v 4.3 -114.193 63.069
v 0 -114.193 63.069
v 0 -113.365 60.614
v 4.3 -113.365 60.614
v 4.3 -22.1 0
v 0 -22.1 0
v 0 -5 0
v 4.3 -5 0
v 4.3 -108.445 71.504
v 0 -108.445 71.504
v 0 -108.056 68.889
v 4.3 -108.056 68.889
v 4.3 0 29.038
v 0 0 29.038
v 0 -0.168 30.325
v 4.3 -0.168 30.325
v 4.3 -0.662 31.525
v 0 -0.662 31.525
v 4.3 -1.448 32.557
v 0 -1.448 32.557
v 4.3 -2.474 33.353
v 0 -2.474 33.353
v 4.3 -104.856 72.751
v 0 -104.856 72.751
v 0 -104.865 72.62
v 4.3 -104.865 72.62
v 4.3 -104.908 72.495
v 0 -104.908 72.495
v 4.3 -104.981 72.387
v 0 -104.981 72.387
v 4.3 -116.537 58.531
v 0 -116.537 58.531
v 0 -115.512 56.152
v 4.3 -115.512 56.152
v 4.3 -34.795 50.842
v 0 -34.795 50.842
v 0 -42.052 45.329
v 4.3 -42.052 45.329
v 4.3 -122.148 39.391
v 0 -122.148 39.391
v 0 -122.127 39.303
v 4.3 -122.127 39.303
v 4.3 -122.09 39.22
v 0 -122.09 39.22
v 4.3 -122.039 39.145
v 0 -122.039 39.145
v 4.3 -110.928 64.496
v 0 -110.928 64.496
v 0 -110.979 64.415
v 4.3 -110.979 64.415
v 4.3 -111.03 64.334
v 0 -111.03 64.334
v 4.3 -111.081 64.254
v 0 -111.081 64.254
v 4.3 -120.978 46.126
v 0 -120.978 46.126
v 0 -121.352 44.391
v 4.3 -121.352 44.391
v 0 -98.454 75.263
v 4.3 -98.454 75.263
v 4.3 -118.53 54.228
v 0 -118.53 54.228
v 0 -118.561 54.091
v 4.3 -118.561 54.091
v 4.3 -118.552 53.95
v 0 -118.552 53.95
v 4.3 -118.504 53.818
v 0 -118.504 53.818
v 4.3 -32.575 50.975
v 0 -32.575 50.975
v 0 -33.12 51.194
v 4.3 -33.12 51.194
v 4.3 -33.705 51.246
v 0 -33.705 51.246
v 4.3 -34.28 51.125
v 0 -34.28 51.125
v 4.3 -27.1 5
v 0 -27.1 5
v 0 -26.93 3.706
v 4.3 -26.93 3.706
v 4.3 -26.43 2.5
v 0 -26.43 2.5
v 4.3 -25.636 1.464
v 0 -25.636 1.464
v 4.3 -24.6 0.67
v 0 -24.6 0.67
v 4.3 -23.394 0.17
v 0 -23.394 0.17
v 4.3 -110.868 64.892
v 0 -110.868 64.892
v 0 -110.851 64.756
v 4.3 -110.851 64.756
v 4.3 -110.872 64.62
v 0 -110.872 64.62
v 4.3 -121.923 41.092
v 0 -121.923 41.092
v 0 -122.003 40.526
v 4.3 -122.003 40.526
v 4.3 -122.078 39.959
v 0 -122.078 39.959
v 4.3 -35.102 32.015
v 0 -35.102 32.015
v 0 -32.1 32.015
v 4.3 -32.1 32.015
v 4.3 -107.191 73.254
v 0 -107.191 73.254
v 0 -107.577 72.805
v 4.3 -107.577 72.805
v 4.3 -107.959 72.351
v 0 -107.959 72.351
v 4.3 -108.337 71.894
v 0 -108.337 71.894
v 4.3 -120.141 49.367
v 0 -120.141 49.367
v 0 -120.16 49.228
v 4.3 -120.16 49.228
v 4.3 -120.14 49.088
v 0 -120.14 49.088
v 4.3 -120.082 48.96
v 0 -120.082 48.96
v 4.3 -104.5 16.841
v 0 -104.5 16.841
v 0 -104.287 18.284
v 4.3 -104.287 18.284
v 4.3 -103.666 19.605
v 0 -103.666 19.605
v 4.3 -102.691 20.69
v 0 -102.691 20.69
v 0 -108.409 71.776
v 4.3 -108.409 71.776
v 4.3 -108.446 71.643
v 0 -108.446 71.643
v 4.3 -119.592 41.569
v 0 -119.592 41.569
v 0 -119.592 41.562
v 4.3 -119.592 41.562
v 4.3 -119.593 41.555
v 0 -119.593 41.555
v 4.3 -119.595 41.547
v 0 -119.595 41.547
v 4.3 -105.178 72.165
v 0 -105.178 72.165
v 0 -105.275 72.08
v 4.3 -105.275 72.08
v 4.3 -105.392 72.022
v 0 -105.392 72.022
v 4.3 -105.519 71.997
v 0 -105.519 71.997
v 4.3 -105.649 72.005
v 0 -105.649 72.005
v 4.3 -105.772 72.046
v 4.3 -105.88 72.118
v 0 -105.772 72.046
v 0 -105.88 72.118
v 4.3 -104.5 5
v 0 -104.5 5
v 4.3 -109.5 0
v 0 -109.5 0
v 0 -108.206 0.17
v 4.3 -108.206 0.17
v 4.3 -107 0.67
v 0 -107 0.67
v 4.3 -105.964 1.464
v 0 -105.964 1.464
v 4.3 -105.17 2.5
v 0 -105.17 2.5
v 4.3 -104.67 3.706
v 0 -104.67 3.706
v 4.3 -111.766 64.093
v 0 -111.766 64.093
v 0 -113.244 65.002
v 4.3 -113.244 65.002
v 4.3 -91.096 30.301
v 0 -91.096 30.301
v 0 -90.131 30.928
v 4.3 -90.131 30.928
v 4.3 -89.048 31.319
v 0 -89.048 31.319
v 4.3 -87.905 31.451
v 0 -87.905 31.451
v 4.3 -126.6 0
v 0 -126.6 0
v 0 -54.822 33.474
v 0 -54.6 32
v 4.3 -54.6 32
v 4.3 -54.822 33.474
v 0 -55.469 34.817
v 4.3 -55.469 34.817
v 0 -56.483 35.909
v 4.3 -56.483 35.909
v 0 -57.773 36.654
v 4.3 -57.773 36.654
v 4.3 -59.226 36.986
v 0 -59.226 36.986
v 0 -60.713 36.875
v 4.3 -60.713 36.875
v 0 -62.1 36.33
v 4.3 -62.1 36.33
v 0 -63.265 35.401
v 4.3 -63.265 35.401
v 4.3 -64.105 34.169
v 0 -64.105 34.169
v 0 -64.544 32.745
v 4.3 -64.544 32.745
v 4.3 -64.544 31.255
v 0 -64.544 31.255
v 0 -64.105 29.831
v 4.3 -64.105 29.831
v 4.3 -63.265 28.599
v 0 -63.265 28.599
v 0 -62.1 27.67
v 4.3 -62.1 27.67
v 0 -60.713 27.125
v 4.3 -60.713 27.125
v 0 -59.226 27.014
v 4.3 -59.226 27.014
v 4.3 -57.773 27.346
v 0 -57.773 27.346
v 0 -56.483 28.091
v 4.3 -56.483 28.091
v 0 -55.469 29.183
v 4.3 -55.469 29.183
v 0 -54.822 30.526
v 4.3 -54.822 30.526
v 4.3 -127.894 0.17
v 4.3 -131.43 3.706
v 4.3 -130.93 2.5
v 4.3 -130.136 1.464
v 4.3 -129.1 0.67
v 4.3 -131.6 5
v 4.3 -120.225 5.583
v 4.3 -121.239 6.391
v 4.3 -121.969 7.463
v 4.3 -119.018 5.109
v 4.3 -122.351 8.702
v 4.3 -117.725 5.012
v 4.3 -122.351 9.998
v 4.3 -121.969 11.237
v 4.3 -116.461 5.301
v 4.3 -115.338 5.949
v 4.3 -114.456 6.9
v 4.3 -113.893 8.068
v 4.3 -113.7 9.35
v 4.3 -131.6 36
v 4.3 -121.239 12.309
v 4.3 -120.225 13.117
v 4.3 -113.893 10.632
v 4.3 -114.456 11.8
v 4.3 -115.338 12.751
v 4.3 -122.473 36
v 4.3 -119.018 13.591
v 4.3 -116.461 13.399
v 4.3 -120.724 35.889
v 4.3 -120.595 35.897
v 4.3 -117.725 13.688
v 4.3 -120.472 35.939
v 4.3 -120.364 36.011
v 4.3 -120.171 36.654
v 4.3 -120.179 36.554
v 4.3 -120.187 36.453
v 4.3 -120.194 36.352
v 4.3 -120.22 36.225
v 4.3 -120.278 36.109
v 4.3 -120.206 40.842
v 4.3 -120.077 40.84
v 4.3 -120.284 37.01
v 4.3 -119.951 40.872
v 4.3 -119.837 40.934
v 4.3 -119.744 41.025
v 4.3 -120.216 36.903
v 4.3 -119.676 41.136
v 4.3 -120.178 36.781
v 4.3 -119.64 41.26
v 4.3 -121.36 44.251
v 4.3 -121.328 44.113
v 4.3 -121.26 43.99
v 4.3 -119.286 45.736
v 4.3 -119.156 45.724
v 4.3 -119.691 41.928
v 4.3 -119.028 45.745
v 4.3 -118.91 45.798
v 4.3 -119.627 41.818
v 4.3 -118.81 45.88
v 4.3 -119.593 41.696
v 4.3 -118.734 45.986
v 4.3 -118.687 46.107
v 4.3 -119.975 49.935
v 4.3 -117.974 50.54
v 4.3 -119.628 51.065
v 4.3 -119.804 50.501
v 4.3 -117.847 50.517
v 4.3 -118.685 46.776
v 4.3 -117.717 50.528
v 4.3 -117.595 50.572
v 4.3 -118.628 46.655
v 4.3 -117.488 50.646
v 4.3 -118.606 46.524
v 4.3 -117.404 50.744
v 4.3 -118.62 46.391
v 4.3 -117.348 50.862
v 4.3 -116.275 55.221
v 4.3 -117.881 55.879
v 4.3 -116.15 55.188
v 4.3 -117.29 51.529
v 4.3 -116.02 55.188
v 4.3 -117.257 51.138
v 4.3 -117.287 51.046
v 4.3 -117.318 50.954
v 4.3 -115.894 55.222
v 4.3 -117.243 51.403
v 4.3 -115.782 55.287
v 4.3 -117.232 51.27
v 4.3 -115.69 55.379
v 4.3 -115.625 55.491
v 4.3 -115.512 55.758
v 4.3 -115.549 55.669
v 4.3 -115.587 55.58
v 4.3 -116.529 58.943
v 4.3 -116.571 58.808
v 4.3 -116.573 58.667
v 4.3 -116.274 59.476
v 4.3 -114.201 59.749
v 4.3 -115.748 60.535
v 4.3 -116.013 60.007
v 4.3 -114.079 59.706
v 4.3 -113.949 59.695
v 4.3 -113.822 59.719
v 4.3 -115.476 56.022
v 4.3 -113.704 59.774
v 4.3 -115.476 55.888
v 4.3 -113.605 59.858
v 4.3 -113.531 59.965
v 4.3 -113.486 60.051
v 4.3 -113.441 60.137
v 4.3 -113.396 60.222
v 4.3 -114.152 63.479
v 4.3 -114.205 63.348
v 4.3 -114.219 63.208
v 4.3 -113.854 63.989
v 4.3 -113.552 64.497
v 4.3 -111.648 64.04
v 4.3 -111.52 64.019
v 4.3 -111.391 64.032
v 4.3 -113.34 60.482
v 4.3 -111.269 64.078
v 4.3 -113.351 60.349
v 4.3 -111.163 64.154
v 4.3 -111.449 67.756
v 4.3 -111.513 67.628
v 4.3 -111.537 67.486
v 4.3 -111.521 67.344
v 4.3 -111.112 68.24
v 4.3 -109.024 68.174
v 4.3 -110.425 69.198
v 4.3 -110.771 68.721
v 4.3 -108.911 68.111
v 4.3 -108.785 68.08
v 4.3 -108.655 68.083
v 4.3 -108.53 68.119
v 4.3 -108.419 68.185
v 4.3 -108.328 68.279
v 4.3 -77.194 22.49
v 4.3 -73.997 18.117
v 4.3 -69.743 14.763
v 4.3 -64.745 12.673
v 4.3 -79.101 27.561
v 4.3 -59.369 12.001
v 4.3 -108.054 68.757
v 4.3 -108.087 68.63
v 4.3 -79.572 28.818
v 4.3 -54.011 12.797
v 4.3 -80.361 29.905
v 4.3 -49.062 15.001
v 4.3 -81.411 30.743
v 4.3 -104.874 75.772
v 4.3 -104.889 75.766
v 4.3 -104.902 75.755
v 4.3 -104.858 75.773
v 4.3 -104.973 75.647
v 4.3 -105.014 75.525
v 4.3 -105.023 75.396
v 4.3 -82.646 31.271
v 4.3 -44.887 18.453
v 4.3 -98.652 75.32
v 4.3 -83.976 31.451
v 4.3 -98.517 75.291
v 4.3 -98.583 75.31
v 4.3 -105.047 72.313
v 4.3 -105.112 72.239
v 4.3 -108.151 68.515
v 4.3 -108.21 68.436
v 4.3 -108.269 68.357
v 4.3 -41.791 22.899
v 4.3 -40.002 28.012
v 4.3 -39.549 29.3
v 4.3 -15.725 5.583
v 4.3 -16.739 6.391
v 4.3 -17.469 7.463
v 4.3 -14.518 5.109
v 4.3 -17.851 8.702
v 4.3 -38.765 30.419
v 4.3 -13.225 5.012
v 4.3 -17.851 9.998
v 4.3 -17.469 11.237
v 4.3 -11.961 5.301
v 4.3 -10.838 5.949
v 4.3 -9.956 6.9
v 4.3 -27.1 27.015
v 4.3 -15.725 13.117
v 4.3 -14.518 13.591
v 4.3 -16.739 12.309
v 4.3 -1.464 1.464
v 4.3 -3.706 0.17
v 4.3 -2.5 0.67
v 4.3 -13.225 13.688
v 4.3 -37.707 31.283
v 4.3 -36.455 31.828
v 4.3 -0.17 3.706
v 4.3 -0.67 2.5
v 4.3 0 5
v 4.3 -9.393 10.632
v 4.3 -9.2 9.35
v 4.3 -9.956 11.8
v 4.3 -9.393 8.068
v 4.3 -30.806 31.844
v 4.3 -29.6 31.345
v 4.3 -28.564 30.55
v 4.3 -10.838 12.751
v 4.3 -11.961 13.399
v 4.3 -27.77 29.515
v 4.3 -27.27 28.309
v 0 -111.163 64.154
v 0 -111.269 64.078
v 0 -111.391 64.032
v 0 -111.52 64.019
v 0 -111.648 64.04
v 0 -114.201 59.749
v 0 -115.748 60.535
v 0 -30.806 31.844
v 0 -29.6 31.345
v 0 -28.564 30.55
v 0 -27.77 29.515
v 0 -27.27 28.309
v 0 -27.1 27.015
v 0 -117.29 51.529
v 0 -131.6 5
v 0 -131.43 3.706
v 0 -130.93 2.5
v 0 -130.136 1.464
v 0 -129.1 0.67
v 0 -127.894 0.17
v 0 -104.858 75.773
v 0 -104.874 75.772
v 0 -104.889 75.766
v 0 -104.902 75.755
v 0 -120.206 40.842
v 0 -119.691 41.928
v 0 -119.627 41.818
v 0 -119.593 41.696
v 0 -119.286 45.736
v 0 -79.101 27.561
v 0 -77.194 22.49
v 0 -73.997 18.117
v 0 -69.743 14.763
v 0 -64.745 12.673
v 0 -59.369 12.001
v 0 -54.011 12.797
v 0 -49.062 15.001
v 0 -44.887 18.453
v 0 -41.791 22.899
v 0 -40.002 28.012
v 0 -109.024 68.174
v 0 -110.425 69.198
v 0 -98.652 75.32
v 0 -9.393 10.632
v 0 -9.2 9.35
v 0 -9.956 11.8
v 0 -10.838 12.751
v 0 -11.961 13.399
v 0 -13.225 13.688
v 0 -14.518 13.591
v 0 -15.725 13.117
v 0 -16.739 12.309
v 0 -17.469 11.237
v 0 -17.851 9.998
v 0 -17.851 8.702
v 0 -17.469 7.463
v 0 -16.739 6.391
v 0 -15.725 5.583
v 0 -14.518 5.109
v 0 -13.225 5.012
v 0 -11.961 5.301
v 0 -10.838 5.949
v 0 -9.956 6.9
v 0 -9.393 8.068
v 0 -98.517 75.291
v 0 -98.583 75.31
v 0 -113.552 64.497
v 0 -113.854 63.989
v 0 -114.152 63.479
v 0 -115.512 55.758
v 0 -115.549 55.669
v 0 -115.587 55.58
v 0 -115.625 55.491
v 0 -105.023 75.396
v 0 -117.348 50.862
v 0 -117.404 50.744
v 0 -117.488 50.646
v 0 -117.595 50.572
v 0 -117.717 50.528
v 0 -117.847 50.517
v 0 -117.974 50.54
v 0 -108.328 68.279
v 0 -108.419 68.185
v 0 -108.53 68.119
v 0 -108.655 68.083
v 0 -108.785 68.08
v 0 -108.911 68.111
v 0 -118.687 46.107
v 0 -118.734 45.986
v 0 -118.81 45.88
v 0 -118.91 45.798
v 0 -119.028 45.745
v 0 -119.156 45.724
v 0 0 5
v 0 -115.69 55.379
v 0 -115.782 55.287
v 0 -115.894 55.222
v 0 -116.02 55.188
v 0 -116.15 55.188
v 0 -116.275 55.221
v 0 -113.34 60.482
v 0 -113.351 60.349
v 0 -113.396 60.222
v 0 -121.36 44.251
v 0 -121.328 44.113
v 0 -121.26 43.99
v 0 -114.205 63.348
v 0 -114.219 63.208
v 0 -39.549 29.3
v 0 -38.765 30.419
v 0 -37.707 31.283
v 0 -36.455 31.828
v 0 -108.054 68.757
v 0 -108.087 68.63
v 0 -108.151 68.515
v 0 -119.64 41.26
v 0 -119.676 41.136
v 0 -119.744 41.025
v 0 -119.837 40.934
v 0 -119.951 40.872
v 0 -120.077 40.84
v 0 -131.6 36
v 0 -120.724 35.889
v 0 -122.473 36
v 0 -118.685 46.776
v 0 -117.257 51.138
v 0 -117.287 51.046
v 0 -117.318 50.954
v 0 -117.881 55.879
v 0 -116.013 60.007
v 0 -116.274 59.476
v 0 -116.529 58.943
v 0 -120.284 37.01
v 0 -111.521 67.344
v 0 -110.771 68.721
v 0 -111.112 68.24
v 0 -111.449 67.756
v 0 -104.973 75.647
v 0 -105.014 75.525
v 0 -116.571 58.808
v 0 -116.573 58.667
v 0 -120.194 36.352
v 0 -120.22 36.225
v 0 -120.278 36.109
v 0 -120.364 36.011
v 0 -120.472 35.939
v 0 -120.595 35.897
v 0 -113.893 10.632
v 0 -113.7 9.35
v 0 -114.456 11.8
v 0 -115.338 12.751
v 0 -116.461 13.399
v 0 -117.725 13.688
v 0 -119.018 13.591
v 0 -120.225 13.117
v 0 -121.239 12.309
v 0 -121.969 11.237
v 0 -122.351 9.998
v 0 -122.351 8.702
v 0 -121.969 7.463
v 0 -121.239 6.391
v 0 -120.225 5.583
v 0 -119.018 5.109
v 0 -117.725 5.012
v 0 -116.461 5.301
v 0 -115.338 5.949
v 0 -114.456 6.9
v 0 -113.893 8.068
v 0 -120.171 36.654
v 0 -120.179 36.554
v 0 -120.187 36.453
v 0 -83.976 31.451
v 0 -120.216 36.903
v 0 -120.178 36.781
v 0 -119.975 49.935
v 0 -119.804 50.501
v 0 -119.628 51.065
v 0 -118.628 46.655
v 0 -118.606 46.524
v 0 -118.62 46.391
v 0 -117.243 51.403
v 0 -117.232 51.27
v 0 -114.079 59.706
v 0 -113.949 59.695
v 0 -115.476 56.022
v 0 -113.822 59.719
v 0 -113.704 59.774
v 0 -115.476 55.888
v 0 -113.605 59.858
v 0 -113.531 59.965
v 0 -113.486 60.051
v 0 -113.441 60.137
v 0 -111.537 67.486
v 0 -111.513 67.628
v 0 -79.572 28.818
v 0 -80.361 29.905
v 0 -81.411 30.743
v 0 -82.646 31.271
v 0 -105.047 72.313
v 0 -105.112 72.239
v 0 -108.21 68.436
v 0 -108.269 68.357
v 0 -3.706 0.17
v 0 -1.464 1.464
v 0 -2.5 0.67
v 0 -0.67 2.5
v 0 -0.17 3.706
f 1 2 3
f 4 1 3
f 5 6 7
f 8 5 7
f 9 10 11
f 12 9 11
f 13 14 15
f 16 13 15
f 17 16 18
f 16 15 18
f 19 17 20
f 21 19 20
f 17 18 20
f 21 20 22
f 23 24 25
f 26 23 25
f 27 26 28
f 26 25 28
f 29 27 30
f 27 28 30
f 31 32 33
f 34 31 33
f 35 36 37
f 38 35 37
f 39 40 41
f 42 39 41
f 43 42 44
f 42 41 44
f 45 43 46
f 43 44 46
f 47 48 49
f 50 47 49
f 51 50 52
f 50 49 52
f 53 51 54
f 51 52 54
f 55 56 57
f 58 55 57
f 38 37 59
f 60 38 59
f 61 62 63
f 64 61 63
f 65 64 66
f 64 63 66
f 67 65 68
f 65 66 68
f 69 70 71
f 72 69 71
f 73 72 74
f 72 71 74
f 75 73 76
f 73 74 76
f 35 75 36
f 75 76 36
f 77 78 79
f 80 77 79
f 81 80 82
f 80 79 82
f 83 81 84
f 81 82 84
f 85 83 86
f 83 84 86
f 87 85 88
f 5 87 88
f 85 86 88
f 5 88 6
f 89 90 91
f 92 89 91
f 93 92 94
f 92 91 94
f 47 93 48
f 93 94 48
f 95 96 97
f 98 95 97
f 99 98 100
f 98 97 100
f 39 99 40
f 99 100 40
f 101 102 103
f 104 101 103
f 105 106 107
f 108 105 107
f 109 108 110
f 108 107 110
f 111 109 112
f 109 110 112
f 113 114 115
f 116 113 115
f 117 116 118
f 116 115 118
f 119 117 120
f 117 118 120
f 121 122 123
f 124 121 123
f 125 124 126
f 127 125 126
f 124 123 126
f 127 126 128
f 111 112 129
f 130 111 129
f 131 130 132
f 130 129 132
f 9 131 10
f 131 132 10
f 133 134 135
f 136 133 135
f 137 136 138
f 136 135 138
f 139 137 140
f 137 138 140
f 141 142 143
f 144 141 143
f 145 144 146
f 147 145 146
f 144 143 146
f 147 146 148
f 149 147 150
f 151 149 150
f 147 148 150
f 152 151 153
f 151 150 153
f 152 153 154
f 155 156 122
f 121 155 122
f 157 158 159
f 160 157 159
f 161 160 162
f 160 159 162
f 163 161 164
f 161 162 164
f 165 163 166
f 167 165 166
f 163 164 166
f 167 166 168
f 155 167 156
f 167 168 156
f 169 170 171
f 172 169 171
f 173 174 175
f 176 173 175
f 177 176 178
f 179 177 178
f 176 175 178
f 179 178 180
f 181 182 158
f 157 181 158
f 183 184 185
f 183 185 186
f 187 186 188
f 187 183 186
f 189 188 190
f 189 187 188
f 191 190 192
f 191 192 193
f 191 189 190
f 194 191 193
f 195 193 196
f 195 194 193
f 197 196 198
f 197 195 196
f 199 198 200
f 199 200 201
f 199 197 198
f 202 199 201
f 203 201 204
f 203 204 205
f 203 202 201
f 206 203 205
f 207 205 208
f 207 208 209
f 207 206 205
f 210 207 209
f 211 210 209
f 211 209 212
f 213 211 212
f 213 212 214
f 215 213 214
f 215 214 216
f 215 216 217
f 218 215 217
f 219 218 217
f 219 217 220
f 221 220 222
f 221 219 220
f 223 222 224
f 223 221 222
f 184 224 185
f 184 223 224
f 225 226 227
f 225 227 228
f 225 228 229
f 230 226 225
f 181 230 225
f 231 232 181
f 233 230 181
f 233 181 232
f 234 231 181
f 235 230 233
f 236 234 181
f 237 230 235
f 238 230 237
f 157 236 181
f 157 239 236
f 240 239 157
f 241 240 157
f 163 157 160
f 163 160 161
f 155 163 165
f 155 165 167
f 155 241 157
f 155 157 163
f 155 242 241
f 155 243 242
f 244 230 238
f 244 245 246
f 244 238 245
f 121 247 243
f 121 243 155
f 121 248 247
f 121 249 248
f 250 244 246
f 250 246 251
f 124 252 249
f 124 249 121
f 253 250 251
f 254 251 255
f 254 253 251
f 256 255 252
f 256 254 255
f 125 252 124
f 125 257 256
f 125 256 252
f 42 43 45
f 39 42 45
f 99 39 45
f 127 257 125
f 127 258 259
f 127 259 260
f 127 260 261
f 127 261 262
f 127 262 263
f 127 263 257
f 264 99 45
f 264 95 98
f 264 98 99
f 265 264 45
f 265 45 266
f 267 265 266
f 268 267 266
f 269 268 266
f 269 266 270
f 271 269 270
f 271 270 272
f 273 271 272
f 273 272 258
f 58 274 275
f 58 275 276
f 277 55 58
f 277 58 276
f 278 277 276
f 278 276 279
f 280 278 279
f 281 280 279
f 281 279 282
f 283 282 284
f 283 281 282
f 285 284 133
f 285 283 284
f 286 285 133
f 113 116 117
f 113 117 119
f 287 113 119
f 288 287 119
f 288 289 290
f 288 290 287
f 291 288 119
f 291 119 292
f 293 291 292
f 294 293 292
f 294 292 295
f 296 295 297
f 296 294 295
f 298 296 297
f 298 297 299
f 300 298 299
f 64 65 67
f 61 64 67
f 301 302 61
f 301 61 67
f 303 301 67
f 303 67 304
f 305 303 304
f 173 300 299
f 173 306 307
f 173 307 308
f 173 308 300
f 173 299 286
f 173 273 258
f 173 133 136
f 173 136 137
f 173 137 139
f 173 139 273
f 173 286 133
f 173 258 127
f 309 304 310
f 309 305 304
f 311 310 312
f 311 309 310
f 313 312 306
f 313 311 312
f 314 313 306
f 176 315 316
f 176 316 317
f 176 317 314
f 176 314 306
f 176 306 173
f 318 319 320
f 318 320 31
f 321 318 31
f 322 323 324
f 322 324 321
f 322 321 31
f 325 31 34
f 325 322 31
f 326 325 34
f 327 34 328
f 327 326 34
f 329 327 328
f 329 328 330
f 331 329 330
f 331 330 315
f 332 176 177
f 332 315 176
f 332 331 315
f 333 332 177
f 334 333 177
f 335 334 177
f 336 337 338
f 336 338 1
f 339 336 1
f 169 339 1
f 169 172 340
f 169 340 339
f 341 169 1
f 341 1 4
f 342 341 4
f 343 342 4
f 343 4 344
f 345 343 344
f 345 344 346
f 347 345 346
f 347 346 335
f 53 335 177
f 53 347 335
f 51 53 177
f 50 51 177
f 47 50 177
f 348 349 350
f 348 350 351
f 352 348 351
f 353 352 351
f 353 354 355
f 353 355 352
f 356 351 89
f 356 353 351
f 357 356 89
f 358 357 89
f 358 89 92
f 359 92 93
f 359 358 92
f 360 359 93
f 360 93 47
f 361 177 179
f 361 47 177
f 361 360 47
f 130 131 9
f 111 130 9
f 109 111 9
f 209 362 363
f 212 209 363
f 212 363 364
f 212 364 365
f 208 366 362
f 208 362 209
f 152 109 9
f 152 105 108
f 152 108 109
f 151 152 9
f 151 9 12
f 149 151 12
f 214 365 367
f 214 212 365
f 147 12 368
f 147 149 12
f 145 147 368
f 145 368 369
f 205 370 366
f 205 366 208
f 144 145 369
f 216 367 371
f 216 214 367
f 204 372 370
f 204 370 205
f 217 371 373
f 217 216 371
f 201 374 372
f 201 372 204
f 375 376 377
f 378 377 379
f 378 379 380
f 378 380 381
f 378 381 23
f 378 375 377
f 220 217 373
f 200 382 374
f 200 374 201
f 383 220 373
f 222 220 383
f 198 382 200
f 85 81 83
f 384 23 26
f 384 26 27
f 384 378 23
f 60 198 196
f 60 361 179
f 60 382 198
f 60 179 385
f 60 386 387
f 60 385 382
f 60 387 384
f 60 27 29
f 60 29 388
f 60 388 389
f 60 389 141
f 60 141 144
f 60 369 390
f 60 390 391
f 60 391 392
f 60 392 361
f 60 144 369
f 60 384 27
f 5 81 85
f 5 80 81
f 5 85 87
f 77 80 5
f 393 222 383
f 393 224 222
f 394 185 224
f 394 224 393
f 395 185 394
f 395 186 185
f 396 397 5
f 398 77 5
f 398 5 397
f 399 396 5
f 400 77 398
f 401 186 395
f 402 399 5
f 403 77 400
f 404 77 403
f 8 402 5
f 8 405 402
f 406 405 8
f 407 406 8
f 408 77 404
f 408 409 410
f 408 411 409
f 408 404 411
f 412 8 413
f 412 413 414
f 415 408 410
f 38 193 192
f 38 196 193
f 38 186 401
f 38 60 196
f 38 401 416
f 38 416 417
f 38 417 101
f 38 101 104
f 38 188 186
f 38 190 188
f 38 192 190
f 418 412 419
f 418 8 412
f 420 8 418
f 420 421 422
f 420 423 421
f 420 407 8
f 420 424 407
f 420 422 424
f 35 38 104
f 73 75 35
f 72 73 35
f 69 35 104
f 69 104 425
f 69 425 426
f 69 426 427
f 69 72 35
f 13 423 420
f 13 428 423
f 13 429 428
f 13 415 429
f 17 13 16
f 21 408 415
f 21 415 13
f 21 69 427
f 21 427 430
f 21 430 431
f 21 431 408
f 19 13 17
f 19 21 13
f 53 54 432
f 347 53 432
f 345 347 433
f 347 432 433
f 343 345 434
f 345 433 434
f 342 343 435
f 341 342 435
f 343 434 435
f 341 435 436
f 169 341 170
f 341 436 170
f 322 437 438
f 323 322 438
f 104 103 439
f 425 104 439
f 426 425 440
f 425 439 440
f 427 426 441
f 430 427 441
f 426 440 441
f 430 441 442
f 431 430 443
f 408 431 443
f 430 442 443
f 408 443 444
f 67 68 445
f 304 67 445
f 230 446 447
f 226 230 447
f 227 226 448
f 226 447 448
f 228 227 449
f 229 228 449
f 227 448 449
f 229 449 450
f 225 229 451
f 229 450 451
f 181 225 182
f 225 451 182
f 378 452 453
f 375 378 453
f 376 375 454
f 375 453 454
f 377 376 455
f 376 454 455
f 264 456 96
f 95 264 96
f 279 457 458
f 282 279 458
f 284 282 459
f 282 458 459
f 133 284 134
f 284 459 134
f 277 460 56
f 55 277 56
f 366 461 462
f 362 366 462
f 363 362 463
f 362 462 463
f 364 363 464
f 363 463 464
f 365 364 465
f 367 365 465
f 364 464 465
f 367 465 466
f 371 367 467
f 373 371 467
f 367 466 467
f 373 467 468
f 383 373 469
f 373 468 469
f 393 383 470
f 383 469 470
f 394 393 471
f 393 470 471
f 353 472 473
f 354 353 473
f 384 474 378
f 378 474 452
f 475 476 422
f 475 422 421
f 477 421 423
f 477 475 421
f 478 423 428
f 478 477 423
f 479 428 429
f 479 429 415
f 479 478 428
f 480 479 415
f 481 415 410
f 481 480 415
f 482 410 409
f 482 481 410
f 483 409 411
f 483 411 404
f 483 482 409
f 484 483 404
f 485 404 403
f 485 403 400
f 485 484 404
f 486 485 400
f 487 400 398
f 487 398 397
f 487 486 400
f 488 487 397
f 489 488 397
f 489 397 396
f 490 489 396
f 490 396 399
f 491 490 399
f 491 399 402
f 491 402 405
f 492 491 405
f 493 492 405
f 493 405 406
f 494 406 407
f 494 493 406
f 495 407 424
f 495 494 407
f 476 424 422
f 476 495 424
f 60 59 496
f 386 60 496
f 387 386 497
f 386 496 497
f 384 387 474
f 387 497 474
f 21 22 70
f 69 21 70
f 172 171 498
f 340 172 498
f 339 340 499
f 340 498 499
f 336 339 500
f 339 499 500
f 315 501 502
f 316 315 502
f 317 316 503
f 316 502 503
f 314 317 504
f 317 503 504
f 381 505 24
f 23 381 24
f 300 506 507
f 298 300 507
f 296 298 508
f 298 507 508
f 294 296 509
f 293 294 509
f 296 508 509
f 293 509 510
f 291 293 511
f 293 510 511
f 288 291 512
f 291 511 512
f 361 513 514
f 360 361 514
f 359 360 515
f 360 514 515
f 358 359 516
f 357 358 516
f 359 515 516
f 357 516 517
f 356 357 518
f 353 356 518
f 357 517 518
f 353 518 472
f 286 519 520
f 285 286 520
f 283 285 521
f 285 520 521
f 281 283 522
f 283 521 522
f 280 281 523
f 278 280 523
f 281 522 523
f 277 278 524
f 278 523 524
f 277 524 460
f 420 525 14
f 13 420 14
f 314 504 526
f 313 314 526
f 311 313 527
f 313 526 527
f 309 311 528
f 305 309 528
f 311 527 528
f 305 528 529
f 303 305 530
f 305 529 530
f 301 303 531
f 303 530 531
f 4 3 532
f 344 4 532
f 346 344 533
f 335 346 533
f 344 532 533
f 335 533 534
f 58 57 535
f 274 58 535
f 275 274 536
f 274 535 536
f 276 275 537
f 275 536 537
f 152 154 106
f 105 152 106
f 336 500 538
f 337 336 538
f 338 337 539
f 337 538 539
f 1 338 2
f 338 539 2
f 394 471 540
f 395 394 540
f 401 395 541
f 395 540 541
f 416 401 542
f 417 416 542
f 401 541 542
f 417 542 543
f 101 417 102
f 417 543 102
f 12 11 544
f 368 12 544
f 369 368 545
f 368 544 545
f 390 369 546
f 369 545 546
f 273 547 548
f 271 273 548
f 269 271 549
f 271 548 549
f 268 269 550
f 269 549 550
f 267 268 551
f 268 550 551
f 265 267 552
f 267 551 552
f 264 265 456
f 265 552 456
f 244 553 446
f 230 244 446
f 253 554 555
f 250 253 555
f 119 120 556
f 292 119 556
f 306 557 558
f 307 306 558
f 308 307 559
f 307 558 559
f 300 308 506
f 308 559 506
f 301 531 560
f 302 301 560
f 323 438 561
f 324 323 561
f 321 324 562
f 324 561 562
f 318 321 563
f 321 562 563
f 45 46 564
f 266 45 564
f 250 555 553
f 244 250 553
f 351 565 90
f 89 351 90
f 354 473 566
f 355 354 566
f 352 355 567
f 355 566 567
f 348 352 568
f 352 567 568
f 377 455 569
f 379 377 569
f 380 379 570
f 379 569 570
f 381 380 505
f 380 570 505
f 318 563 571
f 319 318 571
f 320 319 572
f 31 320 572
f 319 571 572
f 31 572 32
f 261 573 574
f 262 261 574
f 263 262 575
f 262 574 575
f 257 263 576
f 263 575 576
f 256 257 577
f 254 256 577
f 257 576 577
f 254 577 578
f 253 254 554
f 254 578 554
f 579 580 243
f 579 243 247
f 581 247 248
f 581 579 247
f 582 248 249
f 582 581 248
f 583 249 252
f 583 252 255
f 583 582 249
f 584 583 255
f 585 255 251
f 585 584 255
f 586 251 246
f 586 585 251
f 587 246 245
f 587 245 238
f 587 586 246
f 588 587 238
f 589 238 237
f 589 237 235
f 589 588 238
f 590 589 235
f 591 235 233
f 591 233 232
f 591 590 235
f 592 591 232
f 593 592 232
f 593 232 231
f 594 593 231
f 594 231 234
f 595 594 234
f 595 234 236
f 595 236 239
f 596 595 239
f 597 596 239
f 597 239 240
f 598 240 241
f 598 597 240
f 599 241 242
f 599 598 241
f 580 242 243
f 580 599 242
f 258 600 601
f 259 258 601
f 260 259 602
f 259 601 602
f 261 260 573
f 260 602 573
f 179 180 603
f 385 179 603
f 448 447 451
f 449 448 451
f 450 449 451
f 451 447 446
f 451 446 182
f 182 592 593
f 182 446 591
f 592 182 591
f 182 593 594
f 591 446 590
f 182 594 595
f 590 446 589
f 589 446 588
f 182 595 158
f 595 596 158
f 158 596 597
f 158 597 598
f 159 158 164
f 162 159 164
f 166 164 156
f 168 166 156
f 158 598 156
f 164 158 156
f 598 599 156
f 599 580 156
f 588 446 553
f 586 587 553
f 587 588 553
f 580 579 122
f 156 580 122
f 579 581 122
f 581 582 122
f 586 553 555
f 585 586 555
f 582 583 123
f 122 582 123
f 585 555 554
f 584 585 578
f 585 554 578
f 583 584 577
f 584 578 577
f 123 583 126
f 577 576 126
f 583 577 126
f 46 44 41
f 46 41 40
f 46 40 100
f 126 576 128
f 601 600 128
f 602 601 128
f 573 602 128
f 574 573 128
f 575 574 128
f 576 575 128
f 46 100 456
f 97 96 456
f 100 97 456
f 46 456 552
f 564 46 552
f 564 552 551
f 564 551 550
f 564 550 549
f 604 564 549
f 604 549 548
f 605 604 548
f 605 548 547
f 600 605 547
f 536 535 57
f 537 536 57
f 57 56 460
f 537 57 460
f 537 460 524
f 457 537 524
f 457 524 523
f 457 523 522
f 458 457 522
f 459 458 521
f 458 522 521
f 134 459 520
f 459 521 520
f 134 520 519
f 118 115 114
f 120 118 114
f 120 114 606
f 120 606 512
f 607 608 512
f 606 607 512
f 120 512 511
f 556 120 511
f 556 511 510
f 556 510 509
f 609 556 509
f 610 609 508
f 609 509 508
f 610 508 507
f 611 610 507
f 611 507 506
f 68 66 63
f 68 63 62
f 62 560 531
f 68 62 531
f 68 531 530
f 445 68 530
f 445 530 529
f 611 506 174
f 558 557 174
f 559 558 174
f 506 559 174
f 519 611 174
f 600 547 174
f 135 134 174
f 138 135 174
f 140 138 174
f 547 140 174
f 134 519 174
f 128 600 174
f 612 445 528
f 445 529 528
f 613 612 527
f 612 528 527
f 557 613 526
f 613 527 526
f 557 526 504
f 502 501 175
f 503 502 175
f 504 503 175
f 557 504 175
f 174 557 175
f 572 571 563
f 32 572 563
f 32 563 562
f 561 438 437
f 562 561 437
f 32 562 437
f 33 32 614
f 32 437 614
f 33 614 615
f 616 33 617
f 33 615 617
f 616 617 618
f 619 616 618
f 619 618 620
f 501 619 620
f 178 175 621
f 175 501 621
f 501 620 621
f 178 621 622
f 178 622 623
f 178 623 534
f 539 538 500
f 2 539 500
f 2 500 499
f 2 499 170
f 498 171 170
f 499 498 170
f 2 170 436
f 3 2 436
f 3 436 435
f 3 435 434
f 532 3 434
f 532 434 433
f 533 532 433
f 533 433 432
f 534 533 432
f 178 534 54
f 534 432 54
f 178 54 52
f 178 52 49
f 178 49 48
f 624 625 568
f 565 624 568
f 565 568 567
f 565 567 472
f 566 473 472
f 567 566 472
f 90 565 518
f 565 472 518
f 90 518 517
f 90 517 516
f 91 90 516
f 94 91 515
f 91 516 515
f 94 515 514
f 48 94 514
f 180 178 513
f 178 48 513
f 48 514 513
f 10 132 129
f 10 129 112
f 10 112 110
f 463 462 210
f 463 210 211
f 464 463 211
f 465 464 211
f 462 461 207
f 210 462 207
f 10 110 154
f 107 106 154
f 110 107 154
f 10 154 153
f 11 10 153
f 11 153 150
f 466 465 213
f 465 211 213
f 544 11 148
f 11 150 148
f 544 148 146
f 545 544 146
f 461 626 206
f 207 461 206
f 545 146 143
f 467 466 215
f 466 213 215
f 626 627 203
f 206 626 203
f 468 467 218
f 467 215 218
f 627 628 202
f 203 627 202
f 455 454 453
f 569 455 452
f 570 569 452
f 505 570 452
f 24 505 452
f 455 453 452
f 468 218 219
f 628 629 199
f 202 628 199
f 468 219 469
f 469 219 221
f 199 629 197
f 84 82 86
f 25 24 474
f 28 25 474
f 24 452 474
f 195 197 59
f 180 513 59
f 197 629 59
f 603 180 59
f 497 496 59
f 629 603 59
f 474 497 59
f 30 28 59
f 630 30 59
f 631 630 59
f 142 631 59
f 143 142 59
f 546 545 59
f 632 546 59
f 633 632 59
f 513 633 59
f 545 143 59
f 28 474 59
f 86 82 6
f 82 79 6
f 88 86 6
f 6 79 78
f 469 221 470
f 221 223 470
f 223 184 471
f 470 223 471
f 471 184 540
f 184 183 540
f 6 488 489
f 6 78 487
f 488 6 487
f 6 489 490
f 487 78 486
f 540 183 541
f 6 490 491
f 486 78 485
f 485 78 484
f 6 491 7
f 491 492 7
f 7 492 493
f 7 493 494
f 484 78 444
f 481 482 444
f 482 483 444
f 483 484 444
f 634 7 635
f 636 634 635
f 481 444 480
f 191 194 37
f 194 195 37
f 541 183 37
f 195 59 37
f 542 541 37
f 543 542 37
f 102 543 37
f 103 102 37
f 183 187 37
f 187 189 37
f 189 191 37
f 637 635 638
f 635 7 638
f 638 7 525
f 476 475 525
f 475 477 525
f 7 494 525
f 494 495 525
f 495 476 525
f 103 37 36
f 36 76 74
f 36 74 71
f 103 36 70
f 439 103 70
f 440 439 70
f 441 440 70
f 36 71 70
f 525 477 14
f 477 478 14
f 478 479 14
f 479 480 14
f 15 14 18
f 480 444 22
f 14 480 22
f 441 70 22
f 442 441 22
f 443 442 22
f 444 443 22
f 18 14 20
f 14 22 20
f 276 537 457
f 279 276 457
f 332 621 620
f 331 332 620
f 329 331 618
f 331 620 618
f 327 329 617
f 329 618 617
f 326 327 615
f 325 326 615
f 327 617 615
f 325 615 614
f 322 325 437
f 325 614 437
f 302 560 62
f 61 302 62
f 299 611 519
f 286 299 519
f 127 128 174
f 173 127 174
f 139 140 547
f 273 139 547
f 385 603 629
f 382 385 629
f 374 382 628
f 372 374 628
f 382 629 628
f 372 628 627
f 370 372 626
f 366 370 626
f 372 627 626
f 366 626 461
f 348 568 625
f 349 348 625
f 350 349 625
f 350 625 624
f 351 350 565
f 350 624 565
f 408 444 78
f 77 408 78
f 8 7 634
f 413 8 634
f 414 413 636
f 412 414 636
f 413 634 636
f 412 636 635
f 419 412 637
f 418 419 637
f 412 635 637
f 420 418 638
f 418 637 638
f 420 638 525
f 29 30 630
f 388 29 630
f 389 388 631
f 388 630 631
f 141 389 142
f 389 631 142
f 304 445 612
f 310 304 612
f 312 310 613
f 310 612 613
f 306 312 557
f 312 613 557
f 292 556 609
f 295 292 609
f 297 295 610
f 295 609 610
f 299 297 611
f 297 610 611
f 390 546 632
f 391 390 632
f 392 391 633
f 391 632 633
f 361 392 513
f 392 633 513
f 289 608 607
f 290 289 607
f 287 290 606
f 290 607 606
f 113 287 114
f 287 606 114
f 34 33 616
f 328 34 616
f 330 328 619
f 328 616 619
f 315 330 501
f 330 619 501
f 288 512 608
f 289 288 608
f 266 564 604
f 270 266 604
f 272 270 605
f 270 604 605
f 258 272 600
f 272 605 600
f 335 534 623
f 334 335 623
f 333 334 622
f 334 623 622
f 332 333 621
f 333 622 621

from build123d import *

# Parameters (mm, degrees)
F0_R     = 4.35
F0_R_2   = 5
F1_DEPTH = 4.3


with BuildPart() as f1:
    # F0 (on Right) → F1 (new body)
    with BuildSketch(Plane.YZ):
        with BuildLine():
            Line((-22.1, 0), (-5, 0))
            ThreePointArc((-5, 0), (-1.464466, 1.464466), (0, 5))
            Line((0, 5), (0, 29.037729))
            ThreePointArc((0, 29.037729), (-0.662326, 31.524611), (-2.473833, 33.352642))
            Line((-2.473833, 33.352642), (-32.57476, 50.975239))
            ThreePointArc((-32.57476, 50.975239), (-33.70512, 51.245677), (-34.79499, 50.841905))
            Line((-34.79499, 50.841905), (-42.052337, 45.329218))
            Line((-42.052337, 45.329218), (-98.45379, 75.262621))
            ThreePointArc((-98.45379, 75.262621), (-98.549794, 75.301433), (-98.651734, 75.319636))
            Line((-98.651734, 75.319636), (-104.857779, 75.773284))
            ThreePointArc((-104.857779, 75.773284), (-104.881835, 75.769417), (-104.901607, 75.755178))
            ThreePointArc((-104.901607, 75.755178), (-104.997551, 75.587599), (-105.022838, 75.396161))
            Line((-105.022838, 75.396161), (-104.855972, 72.750564))
            ThreePointArc((-104.855972, 72.750564), (-104.882304, 72.556066), (-104.98147, 72.386689))
            ThreePointArc((-104.98147, 72.386689), (-105.0797, 72.27604), (-105.177659, 72.165152))
            ThreePointArc((-105.177659, 72.165152), (-105.519248, 71.996856), (-105.880288, 72.117919))
            Line((-105.880288, 72.117919), (-107.19123, 73.254305))
            ThreePointArc((-107.19123, 73.254305), (-107.768907, 72.57831), (-108.336982, 71.894228))
            ThreePointArc((-108.336982, 71.894228), (-108.432061, 71.710527), (-108.44465, 71.504063))
            Line((-108.44465, 71.504063), (-108.056233, 68.888956))
            ThreePointArc((-108.056233, 68.888956), (-108.06619, 68.692429), (-108.151209, 68.514964))
            ThreePointArc((-108.151209, 68.514964), (-108.239818, 68.396849), (-108.328139, 68.27852))
            ThreePointArc((-108.328139, 68.27852), (-108.65472, 68.082686), (-109.024498, 68.17363))
            Line((-109.024498, 68.17363), (-110.424503, 69.198289))
            ThreePointArc((-110.424503, 69.198289), (-110.941832, 68.480942), (-111.449037, 67.756402))
            ThreePointArc((-111.449037, 67.756402), (-111.530067, 67.558002), (-111.520592, 67.343902))
            Line((-111.520592, 67.343902), (-110.867678, 64.891617))
            ThreePointArc((-110.867678, 64.891617), (-110.856617, 64.687221), (-110.92839, 64.495521))
            ThreePointArc((-110.92839, 64.495521), (-111.004676, 64.374709), (-111.080678, 64.253718))
            ThreePointArc((-111.080678, 64.253718), (-111.390502, 64.032323), (-111.766382, 64.093319))
            Line((-111.766382, 64.093319), (-113.244054, 65.002399))
            ThreePointArc((-113.244054, 65.002399), (-113.70347, 64.243719), (-114.152157, 63.478645))
            ThreePointArc((-114.152157, 63.478645), (-114.216631, 63.278226), (-114.192891, 63.069034))
            Line((-114.192891, 63.069034), (-113.365453, 60.614331))
            ThreePointArc((-113.365453, 60.614331), (-113.340818, 60.415154), (-113.396489, 60.222336))
            ThreePointArc((-113.396489, 60.222336), (-113.463838, 60.093583), (-113.53088, 59.964669))
            ThreePointArc((-113.53088, 59.964669), (-113.821693, 59.718835), (-114.201286, 59.749091))
            Line((-114.201286, 59.749091), (-115.74793, 60.535116))
            ThreePointArc((-115.74793, 60.535116), (-116.14419, 59.74162), (-116.529237, 58.942622))
            ThreePointArc((-116.529237, 58.942622), (-116.577215, 58.737628), (-116.536559, 58.531056))
            Line((-116.536559, 58.531056), (-115.512428, 56.151691))
            ThreePointArc((-115.512428, 56.151691), (-115.471694, 55.955174), (-115.511515, 55.758471))
            ThreePointArc((-115.511515, 55.758471), (-115.568182, 55.624671), (-115.624528, 55.490737))
            ThreePointArc((-115.624528, 55.490737), (-115.894408, 55.222089), (-116.275204, 55.221406))
            Line((-116.275204, 55.221406), (-117.880594, 55.879179))
            Line((-117.880594, 55.879179), (-118.52994, 54.228474))
            ThreePointArc((-118.52994, 54.228474), (-118.561106, 54.020259), (-118.503801, 53.817674))
            Line((-118.503801, 53.817674), (-117.28975, 51.529377))
            ThreePointArc((-117.28975, 51.529377), (-117.233185, 51.336819), (-117.256894, 51.137531))
            ThreePointArc((-117.256894, 51.137531), (-117.302503, 50.99957), (-117.347782, 50.861501))
            ThreePointArc((-117.347782, 50.861501), (-117.594943, 50.571815), (-117.974426, 50.540197))
            Line((-117.974426, 50.540197), (-119.627948, 51.06537))
            ThreePointArc((-119.627948, 51.06537), (-119.890472, 50.218175), (-120.141039, 49.367367))
            ThreePointArc((-120.141039, 49.367367), (-120.155186, 49.157308), (-120.081612, 48.960048))
            Line((-120.081612, 48.960048), (-118.684637, 46.776338))
            ThreePointArc((-118.684637, 46.776338), (-118.61281, 46.590175), (-118.619501, 46.390749))
            Line((-118.619501, 46.390749), (-118.68725, 46.107071))
            ThreePointArc((-118.68725, 46.107071), (-118.910066, 45.798287), (-119.285711, 45.735952))
            Line((-119.285711, 45.735952), (-120.978439, 46.125513))
            Line((-120.978439, 46.125513), (-121.351884, 44.391438))
            ThreePointArc((-121.351884, 44.391438), (-121.348918, 44.180925), (-121.259561, 43.990294))
            Line((-121.259561, 43.990294), (-119.690523, 41.928256))
            ThreePointArc((-119.690523, 41.928256), (-119.606388, 41.758287), (-119.591605, 41.569211))
            ThreePointArc((-119.591605, 41.569211), (-119.592977, 41.558197), (-119.594592, 41.547217))
            Line((-119.594592, 41.547217), (-119.640055, 41.26036))
            ThreePointArc((-119.640055, 41.26036), (-119.83704, 40.934471), (-120.206393, 40.841815))
            Line((-120.206393, 40.841815), (-121.923138, 41.092269))
            ThreePointArc((-121.923138, 41.092269), (-122.041201, 40.24253), (-122.147679, 39.391262))
            ThreePointArc((-122.147679, 39.391262), (-122.110207, 39.260888), (-122.03907, 39.145384))
            Line((-122.03907, 39.145384), (-120.283735, 37.010276))
            ThreePointArc((-120.283735, 37.010276), (-120.193147, 36.843224), (-120.171435, 36.654436))
            ThreePointArc((-120.171435, 36.654436), (-120.182866, 36.503198), (-120.19392, 36.351932))
            ThreePointArc((-120.19392, 36.351932), (-120.363778, 36.011117), (-120.724382, 35.888759))
            Line((-120.724382, 35.888759), (-122.472888, 36))
            Line((-122.472888, 36), (-131.6, 36))
            Line((-131.6, 36), (-131.6, 5))
            ThreePointArc((-131.6, 5), (-130.135534, 1.464466), (-126.6, 0))
            Line((-126.6, 0), (-109.5, 0))
            ThreePointArc((-109.5, 0), (-105.964466, 1.464466), (-104.5, 5))
            Line((-104.5, 5), (-104.5, 16.84052))
            ThreePointArc((-104.5, 16.84052), (-104.025137, 18.967287), (-102.690745, 20.690085))
            Line((-102.690745, 20.690085), (-91.09576, 30.300687))
            ThreePointArc((-91.09576, 30.300687), (-89.600918, 31.154729), (-87.905015, 31.451123))
            Line((-87.905015, 31.451123), (-83.976422, 31.451123))
            ThreePointArc((-83.976422, 31.451123), (-80.857839, 30.359375), (-79.101138, 27.560898))
            ThreePointArc((-79.101138, 27.560898), (-59.369338, 12.00133), (-40.001664, 28.011865))
            ThreePointArc((-40.001664, 28.011865), (-38.26553, 30.886857), (-35.10208, 32.014832))
            Line((-35.10208, 32.014832), (-32.1, 32.014832))
            ThreePointArc((-32.1, 32.014832), (-28.564466, 30.550365), (-27.1, 27.014832))
            Line((-27.1, 27.014832), (-27.1, 5))
            ThreePointArc((-27.1, 5), (-25.635534, 1.464466), (-22.1, 0))
        make_face()
        with Locations((-118.05, 9.35)):
            Circle(F0_R, mode=Mode.SUBTRACT)
        with Locations((-13.55, 9.35)):
            Circle(F0_R, mode=Mode.SUBTRACT)
        with Locations((-59.6, 32)):
            Circle(F0_R_2, mode=Mode.SUBTRACT)
    extrude(amount=F1_DEPTH)


solid = f1.part
